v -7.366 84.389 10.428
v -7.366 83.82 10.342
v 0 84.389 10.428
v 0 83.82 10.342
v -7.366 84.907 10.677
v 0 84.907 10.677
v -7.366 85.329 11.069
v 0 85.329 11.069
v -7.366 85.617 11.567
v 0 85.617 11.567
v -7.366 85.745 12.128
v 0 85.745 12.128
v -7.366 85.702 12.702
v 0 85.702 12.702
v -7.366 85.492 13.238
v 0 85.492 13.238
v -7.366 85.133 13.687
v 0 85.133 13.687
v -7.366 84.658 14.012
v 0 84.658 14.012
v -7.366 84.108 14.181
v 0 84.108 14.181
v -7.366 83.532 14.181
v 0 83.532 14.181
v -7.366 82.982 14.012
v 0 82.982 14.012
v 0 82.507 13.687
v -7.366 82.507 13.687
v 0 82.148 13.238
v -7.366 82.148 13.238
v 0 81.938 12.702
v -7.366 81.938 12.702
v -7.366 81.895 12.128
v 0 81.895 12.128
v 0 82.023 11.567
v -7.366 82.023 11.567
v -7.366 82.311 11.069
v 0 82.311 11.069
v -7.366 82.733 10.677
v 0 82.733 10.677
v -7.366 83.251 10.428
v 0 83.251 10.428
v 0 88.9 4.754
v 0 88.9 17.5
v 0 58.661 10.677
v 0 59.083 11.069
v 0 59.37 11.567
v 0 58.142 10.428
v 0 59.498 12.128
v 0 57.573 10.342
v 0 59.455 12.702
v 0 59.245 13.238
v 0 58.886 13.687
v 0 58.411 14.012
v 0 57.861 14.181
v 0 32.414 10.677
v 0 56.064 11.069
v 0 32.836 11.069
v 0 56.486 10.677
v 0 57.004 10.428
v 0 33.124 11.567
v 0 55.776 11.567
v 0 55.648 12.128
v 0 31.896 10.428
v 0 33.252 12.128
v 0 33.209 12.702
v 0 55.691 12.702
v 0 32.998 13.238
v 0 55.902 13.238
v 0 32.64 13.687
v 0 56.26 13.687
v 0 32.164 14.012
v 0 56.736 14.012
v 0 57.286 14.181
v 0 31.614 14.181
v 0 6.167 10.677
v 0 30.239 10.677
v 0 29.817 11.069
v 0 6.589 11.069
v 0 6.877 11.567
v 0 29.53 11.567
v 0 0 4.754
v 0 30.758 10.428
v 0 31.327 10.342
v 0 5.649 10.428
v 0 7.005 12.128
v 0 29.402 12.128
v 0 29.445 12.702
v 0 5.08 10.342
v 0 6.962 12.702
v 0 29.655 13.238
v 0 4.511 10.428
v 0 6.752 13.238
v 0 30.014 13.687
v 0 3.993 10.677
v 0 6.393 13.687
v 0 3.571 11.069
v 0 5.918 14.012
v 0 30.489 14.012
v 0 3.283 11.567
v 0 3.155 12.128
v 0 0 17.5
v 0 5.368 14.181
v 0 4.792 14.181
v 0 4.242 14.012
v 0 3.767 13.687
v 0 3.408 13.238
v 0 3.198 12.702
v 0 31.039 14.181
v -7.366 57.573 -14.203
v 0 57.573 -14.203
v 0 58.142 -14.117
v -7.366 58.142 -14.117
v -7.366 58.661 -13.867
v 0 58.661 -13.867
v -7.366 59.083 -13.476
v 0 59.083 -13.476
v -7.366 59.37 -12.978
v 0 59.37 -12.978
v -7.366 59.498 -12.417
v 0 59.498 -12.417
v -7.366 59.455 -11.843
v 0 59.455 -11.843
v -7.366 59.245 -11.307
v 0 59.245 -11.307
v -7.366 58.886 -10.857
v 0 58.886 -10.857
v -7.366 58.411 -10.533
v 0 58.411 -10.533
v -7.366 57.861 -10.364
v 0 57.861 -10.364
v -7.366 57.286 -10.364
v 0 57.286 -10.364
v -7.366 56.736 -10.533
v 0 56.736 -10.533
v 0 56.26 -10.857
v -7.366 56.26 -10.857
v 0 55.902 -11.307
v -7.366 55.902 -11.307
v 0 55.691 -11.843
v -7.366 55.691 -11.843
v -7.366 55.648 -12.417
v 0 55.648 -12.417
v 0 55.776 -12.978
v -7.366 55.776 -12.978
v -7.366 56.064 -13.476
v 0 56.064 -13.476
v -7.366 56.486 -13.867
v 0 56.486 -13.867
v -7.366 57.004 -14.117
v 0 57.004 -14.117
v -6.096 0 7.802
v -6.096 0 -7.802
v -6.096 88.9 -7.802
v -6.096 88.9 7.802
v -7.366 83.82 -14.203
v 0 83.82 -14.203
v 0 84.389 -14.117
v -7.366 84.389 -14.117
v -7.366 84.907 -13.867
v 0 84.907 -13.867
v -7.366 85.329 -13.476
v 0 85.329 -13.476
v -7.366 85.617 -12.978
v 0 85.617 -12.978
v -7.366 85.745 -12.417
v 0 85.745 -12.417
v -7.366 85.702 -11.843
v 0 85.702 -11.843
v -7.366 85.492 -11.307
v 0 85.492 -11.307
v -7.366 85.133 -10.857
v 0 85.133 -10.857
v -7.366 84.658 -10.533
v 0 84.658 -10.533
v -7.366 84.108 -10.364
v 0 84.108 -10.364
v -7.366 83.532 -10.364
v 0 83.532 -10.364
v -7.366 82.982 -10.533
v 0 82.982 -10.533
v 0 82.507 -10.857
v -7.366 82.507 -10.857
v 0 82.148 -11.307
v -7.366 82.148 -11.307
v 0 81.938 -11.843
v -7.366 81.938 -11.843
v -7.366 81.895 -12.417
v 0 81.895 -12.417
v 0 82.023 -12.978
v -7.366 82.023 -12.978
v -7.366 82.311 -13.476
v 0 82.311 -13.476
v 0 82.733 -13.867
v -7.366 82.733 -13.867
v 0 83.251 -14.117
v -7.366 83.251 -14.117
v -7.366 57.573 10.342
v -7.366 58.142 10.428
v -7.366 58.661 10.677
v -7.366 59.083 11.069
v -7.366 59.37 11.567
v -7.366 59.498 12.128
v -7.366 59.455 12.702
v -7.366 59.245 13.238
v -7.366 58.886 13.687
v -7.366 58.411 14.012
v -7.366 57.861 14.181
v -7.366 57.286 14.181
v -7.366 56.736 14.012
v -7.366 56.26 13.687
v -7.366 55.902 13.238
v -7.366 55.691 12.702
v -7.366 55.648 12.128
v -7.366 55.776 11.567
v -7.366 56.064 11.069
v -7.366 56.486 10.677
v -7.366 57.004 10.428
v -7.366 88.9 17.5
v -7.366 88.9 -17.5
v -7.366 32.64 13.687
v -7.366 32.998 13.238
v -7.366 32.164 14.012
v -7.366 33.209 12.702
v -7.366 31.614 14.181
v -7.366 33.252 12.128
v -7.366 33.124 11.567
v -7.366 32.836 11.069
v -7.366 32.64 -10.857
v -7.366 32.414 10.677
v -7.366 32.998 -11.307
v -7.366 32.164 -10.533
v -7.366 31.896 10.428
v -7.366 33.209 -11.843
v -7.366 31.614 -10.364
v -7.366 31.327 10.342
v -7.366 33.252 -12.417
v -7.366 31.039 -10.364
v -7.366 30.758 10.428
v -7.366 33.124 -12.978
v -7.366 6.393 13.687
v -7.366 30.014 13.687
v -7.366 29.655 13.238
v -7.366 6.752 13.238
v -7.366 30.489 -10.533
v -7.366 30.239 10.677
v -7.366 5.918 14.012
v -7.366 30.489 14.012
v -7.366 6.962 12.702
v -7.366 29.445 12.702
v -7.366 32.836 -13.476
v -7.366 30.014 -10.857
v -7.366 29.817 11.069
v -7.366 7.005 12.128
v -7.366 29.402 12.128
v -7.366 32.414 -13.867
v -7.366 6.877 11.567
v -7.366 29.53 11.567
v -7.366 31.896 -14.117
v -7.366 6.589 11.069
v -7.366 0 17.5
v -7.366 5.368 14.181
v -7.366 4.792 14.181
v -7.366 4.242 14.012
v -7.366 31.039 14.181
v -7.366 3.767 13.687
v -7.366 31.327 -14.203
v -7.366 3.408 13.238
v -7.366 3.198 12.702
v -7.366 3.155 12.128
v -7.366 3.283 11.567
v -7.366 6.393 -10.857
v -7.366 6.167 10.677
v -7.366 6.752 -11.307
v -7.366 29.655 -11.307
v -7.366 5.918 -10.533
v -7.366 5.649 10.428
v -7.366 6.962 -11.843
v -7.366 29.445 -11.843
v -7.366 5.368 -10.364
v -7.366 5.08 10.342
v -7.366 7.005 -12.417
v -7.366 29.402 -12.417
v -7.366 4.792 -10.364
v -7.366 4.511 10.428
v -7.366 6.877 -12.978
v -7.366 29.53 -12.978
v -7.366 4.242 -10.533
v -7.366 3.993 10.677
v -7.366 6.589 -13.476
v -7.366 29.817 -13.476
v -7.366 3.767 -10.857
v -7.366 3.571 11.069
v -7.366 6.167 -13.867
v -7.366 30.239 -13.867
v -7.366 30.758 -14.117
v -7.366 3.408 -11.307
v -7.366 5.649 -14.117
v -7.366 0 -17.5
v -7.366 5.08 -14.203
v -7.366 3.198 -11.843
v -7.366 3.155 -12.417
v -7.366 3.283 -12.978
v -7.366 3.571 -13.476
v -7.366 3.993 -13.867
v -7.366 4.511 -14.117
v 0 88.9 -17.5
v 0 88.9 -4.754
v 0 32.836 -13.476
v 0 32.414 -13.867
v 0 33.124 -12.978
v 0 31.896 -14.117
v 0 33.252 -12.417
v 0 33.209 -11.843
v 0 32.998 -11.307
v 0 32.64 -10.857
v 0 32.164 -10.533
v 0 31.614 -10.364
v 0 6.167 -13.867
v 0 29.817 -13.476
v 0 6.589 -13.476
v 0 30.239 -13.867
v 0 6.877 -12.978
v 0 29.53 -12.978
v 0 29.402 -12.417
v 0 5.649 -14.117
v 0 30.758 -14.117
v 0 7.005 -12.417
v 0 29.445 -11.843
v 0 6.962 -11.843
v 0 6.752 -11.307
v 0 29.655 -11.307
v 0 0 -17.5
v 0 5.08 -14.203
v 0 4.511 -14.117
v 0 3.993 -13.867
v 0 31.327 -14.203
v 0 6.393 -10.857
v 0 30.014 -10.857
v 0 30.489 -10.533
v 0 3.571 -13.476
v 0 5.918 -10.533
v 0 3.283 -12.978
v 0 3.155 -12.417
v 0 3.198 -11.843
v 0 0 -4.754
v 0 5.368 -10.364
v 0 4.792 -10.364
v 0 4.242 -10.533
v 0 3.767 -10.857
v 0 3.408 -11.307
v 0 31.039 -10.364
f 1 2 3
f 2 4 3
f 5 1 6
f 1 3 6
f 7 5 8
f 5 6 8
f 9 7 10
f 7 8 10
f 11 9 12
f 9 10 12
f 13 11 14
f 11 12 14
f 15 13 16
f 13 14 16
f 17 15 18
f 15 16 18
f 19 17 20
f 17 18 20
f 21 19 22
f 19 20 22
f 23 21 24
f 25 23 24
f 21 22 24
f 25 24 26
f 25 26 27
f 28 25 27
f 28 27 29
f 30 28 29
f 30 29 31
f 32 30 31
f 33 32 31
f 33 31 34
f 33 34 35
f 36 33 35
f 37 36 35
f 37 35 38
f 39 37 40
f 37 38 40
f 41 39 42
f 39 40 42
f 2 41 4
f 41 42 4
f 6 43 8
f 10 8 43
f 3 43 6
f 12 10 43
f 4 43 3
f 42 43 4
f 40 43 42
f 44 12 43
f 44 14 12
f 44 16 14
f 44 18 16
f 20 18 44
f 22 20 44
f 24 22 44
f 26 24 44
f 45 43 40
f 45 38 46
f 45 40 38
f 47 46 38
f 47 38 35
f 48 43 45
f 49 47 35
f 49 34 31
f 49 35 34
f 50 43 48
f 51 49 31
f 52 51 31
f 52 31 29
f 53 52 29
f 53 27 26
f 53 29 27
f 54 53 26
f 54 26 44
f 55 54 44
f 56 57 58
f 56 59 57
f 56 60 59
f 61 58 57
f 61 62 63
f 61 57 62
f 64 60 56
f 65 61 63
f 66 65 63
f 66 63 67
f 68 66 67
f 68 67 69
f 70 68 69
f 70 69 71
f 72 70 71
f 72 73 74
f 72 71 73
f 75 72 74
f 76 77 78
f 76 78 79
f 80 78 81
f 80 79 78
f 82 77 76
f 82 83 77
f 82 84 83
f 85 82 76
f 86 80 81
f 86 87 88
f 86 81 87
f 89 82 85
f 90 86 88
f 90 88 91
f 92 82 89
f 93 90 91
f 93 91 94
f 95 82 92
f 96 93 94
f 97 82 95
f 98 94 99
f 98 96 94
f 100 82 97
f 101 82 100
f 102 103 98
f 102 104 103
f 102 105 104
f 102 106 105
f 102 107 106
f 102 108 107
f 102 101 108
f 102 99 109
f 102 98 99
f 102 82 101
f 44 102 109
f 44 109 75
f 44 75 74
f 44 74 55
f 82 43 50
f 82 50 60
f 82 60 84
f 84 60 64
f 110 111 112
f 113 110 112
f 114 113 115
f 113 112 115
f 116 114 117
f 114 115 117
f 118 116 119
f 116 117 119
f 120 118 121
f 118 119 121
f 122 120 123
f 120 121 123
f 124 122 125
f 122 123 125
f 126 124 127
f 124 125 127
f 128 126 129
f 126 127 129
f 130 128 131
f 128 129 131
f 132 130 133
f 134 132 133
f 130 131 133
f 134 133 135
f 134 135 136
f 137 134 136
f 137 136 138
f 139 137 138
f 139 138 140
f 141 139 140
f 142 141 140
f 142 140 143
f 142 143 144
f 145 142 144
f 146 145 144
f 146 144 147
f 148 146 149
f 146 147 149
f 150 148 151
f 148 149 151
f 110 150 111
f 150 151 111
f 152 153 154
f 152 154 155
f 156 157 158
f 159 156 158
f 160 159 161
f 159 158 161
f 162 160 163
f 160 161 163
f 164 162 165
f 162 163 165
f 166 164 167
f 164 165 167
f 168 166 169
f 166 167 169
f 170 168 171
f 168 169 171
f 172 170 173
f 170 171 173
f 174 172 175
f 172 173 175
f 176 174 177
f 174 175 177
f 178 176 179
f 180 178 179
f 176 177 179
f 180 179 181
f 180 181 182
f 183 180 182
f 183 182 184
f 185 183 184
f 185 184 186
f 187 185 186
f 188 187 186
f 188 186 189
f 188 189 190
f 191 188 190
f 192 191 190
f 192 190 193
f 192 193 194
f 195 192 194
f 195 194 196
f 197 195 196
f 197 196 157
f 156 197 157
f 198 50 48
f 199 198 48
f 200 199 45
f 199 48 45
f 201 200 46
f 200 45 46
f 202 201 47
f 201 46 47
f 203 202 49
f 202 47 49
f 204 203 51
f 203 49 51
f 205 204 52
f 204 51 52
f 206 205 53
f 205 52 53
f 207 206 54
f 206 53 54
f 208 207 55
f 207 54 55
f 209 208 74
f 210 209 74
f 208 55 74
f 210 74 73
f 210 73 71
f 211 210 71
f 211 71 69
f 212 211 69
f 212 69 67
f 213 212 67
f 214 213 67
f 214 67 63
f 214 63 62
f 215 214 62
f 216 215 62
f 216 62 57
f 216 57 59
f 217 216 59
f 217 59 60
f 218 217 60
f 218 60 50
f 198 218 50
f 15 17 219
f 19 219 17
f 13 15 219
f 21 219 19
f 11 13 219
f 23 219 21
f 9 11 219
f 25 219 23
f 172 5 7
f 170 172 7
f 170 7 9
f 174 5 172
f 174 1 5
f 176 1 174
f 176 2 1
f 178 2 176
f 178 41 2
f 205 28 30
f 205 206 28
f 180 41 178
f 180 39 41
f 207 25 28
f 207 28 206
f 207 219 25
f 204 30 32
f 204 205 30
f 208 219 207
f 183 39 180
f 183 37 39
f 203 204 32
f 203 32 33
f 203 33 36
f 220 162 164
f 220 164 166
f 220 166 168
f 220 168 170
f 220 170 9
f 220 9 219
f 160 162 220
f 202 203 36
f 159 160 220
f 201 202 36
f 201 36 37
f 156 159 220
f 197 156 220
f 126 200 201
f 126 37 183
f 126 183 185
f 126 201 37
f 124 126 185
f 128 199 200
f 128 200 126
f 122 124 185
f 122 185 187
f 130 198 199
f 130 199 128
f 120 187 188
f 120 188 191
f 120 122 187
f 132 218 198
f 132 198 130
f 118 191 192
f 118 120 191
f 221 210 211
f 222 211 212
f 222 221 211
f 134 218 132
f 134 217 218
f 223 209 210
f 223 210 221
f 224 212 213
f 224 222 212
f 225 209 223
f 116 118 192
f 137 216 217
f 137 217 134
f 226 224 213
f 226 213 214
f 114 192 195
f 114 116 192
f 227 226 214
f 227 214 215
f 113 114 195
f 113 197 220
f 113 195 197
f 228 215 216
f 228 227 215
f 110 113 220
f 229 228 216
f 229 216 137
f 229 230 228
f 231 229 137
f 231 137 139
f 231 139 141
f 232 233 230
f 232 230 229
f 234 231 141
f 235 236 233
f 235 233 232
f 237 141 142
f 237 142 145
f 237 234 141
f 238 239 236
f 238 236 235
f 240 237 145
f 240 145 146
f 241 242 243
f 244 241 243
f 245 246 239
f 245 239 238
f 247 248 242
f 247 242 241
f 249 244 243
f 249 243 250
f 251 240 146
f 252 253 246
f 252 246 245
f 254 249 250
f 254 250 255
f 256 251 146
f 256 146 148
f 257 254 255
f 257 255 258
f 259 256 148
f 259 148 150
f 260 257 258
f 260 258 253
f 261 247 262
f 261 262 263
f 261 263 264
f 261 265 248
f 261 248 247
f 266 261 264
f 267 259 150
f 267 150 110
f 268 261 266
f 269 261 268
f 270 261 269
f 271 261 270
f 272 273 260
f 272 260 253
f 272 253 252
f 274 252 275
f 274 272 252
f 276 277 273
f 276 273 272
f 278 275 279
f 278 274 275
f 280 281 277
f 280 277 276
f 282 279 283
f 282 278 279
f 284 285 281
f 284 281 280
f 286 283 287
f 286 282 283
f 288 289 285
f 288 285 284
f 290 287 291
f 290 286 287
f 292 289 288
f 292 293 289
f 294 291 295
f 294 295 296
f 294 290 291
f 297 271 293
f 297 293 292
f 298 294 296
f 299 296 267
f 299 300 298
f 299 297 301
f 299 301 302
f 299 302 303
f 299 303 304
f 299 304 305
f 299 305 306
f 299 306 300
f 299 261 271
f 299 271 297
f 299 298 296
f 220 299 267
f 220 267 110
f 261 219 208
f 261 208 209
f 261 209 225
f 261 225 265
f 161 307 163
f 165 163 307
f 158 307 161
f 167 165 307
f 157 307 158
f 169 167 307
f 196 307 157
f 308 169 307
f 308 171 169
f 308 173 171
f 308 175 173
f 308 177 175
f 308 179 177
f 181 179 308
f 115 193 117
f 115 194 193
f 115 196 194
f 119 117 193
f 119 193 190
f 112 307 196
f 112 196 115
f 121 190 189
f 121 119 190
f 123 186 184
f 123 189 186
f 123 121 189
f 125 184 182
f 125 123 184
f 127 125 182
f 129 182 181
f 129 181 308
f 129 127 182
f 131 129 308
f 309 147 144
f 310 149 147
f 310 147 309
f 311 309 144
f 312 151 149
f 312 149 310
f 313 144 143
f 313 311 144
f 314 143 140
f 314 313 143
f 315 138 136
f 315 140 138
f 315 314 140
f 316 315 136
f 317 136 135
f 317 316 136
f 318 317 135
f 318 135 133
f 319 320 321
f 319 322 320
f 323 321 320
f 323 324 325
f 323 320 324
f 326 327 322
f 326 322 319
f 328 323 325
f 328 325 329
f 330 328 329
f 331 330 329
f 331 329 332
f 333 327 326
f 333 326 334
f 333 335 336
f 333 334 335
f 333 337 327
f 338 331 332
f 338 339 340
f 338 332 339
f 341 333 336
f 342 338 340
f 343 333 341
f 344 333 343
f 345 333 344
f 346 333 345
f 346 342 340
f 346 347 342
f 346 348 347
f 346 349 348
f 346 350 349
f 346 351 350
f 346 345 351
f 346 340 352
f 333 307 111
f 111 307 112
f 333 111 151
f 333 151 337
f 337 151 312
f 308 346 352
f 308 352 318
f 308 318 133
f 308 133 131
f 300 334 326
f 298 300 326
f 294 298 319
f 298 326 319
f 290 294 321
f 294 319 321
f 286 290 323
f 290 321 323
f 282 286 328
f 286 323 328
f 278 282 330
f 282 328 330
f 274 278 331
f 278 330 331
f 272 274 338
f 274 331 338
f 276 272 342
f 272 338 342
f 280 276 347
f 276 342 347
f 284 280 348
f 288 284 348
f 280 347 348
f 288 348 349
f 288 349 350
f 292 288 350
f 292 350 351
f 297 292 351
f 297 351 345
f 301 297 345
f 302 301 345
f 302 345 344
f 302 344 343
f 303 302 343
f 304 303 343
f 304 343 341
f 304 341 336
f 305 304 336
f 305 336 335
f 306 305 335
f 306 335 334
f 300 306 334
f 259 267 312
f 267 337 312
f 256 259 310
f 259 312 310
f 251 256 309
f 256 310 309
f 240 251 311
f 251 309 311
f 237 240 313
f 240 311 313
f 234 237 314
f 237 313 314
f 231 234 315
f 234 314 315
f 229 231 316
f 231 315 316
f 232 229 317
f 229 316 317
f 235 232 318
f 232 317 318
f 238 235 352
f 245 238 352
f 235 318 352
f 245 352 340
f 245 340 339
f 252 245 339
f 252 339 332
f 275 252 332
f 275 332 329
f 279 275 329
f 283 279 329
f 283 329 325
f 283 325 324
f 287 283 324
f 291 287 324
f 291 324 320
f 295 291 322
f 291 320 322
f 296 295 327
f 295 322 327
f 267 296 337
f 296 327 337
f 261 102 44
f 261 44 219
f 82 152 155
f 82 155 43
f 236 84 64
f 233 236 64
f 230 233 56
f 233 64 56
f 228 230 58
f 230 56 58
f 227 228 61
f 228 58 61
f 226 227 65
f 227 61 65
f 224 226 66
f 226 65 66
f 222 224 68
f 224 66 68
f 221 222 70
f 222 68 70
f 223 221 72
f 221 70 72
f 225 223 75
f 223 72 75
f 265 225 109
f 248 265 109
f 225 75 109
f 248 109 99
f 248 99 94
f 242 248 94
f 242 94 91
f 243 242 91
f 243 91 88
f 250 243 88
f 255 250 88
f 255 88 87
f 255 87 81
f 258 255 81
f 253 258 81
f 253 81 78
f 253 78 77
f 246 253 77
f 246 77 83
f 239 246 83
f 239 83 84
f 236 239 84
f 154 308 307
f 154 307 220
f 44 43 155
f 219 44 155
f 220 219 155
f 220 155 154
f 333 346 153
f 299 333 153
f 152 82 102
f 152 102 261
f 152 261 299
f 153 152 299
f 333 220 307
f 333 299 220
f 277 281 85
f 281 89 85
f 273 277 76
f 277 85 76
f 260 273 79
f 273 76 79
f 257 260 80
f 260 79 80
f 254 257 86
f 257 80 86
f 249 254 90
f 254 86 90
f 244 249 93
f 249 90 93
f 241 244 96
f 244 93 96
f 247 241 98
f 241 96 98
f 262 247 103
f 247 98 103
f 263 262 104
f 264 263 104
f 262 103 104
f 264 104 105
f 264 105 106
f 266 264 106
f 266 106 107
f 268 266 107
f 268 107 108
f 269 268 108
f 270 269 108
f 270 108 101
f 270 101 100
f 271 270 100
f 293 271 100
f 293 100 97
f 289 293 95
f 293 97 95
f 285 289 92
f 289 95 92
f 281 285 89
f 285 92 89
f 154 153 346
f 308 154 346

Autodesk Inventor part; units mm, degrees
ref_plane "YZ Plane" through (0, 0, 0) normal (1, 0, 0) x (0, 1, 0)
ref_plane "XZ Plane" through (0, 0, 0) normal (0, 1, 0) x (-1, 0, 0)
ref_plane "XY Plane" through (0, 0, 0) normal (0, 0, 1) x (1, 0, 0)
sketch "Sketch1" plane through (0, 0, 0) normal (0, 1, 0) x (-1, 0, 0)
  line L0 (0, 17.5) -> (7.366, 17.5)
  line L1 (7.366, 17.5) -> (7.366, -17.5)
  line L2 (7.366, -17.5) -> (0, -17.5)
  line L3 (6.096, 4.754) -> (6.096, -4.754)
  line L4 (0, 4.754) -> (0, 7.802)
  line L5 (6.096, 7.802) -> (6.096, 4.754)
  line L6 (0, -4.754) -> (0, -5.048)
  line L7 (6.096, -7.802) -> (6.096, -4.754)
  line L8 (6.096, 7.802) -> (0, 4.754)
  line L9 (6.096, -7.802) -> (0, -4.754)
  line L10 (0, -17.5) -> (0, -4.754)
  line L11 (0, 4.754) -> (0, 17.5)
  point P0 (0, 0)
  dimension "d0" = 7.366
  dimension "d1" = 35
  dimension "d2" = 17.5
  dimension "d8" = 9.508
  dimension "d9" = 4.754
  dimension "d10" = 3.048
  dimension "d11" = 3.048
  dimension "d12" = 6.096
  dimension "d16" = 15.604
extrude "Shape" add sketch "Sketch1" along normal blind 88.9
sketch "Sketch2" plane through (0, 0, -4.754) normal (1, 0, 0) x (0, 0, -1)
  circle A0 centre (7.5184, 5.08) radius 1.9304
  line L0 (3.048, 0) -> (3.048, 88.9) construction
  line L1 (-12.556, 0) -> (-12.556, 88.9) construction
  line L2 (0, 0) -> (12.746, 0) construction
  line L3 (0, 88.9) -> (12.746, 88.9) construction
  circle A1 centre (7.5184, 31.3267) radius 1.9304
  circle A2 centre (7.5184, 57.5733) radius 1.9304
  circle A3 centre (7.5184, 83.82) radius 1.9304
  circle A4 centre (-17.0264, 5.08) radius 1.9304
  line L4 (-22.254, 0) -> (-9.508, 0) construction
  circle A5 centre (-17.0264, 31.3267) radius 1.9304
  circle A6 centre (-17.0264, 57.5733) radius 1.9304
  circle A7 centre (-17.0264, 83.82) radius 1.9304
  point P0 (-4.754, 0)
  dimension "d19" = 3.8608
  dimension "d20" = 4.4704
  dimension "d21" = 88.9
  dimension "d22" = 5.08
  dimension "d25" = 26.2467
  dimension "d30" = 3.8608
  dimension "d31" = 4.4704
  dimension "d32" = 5.08
  dimension "d35" = 26.2467
extrude "Extrusion2" cut sketch "Sketch2" against normal through all
ref_plane "Work Plane1" through (0, 0, 0) normal (0, 0, -1) x (-1, 0, 0)
equation "\"d2\" = 0.5 * d1"
equation "\"d9\" = 0.5 * d8"
equation "\"d11\" = d10"
equation "\"d31\" = d20"
equation "\"d32\" = d22"
properties part number "Coupler receiver"
